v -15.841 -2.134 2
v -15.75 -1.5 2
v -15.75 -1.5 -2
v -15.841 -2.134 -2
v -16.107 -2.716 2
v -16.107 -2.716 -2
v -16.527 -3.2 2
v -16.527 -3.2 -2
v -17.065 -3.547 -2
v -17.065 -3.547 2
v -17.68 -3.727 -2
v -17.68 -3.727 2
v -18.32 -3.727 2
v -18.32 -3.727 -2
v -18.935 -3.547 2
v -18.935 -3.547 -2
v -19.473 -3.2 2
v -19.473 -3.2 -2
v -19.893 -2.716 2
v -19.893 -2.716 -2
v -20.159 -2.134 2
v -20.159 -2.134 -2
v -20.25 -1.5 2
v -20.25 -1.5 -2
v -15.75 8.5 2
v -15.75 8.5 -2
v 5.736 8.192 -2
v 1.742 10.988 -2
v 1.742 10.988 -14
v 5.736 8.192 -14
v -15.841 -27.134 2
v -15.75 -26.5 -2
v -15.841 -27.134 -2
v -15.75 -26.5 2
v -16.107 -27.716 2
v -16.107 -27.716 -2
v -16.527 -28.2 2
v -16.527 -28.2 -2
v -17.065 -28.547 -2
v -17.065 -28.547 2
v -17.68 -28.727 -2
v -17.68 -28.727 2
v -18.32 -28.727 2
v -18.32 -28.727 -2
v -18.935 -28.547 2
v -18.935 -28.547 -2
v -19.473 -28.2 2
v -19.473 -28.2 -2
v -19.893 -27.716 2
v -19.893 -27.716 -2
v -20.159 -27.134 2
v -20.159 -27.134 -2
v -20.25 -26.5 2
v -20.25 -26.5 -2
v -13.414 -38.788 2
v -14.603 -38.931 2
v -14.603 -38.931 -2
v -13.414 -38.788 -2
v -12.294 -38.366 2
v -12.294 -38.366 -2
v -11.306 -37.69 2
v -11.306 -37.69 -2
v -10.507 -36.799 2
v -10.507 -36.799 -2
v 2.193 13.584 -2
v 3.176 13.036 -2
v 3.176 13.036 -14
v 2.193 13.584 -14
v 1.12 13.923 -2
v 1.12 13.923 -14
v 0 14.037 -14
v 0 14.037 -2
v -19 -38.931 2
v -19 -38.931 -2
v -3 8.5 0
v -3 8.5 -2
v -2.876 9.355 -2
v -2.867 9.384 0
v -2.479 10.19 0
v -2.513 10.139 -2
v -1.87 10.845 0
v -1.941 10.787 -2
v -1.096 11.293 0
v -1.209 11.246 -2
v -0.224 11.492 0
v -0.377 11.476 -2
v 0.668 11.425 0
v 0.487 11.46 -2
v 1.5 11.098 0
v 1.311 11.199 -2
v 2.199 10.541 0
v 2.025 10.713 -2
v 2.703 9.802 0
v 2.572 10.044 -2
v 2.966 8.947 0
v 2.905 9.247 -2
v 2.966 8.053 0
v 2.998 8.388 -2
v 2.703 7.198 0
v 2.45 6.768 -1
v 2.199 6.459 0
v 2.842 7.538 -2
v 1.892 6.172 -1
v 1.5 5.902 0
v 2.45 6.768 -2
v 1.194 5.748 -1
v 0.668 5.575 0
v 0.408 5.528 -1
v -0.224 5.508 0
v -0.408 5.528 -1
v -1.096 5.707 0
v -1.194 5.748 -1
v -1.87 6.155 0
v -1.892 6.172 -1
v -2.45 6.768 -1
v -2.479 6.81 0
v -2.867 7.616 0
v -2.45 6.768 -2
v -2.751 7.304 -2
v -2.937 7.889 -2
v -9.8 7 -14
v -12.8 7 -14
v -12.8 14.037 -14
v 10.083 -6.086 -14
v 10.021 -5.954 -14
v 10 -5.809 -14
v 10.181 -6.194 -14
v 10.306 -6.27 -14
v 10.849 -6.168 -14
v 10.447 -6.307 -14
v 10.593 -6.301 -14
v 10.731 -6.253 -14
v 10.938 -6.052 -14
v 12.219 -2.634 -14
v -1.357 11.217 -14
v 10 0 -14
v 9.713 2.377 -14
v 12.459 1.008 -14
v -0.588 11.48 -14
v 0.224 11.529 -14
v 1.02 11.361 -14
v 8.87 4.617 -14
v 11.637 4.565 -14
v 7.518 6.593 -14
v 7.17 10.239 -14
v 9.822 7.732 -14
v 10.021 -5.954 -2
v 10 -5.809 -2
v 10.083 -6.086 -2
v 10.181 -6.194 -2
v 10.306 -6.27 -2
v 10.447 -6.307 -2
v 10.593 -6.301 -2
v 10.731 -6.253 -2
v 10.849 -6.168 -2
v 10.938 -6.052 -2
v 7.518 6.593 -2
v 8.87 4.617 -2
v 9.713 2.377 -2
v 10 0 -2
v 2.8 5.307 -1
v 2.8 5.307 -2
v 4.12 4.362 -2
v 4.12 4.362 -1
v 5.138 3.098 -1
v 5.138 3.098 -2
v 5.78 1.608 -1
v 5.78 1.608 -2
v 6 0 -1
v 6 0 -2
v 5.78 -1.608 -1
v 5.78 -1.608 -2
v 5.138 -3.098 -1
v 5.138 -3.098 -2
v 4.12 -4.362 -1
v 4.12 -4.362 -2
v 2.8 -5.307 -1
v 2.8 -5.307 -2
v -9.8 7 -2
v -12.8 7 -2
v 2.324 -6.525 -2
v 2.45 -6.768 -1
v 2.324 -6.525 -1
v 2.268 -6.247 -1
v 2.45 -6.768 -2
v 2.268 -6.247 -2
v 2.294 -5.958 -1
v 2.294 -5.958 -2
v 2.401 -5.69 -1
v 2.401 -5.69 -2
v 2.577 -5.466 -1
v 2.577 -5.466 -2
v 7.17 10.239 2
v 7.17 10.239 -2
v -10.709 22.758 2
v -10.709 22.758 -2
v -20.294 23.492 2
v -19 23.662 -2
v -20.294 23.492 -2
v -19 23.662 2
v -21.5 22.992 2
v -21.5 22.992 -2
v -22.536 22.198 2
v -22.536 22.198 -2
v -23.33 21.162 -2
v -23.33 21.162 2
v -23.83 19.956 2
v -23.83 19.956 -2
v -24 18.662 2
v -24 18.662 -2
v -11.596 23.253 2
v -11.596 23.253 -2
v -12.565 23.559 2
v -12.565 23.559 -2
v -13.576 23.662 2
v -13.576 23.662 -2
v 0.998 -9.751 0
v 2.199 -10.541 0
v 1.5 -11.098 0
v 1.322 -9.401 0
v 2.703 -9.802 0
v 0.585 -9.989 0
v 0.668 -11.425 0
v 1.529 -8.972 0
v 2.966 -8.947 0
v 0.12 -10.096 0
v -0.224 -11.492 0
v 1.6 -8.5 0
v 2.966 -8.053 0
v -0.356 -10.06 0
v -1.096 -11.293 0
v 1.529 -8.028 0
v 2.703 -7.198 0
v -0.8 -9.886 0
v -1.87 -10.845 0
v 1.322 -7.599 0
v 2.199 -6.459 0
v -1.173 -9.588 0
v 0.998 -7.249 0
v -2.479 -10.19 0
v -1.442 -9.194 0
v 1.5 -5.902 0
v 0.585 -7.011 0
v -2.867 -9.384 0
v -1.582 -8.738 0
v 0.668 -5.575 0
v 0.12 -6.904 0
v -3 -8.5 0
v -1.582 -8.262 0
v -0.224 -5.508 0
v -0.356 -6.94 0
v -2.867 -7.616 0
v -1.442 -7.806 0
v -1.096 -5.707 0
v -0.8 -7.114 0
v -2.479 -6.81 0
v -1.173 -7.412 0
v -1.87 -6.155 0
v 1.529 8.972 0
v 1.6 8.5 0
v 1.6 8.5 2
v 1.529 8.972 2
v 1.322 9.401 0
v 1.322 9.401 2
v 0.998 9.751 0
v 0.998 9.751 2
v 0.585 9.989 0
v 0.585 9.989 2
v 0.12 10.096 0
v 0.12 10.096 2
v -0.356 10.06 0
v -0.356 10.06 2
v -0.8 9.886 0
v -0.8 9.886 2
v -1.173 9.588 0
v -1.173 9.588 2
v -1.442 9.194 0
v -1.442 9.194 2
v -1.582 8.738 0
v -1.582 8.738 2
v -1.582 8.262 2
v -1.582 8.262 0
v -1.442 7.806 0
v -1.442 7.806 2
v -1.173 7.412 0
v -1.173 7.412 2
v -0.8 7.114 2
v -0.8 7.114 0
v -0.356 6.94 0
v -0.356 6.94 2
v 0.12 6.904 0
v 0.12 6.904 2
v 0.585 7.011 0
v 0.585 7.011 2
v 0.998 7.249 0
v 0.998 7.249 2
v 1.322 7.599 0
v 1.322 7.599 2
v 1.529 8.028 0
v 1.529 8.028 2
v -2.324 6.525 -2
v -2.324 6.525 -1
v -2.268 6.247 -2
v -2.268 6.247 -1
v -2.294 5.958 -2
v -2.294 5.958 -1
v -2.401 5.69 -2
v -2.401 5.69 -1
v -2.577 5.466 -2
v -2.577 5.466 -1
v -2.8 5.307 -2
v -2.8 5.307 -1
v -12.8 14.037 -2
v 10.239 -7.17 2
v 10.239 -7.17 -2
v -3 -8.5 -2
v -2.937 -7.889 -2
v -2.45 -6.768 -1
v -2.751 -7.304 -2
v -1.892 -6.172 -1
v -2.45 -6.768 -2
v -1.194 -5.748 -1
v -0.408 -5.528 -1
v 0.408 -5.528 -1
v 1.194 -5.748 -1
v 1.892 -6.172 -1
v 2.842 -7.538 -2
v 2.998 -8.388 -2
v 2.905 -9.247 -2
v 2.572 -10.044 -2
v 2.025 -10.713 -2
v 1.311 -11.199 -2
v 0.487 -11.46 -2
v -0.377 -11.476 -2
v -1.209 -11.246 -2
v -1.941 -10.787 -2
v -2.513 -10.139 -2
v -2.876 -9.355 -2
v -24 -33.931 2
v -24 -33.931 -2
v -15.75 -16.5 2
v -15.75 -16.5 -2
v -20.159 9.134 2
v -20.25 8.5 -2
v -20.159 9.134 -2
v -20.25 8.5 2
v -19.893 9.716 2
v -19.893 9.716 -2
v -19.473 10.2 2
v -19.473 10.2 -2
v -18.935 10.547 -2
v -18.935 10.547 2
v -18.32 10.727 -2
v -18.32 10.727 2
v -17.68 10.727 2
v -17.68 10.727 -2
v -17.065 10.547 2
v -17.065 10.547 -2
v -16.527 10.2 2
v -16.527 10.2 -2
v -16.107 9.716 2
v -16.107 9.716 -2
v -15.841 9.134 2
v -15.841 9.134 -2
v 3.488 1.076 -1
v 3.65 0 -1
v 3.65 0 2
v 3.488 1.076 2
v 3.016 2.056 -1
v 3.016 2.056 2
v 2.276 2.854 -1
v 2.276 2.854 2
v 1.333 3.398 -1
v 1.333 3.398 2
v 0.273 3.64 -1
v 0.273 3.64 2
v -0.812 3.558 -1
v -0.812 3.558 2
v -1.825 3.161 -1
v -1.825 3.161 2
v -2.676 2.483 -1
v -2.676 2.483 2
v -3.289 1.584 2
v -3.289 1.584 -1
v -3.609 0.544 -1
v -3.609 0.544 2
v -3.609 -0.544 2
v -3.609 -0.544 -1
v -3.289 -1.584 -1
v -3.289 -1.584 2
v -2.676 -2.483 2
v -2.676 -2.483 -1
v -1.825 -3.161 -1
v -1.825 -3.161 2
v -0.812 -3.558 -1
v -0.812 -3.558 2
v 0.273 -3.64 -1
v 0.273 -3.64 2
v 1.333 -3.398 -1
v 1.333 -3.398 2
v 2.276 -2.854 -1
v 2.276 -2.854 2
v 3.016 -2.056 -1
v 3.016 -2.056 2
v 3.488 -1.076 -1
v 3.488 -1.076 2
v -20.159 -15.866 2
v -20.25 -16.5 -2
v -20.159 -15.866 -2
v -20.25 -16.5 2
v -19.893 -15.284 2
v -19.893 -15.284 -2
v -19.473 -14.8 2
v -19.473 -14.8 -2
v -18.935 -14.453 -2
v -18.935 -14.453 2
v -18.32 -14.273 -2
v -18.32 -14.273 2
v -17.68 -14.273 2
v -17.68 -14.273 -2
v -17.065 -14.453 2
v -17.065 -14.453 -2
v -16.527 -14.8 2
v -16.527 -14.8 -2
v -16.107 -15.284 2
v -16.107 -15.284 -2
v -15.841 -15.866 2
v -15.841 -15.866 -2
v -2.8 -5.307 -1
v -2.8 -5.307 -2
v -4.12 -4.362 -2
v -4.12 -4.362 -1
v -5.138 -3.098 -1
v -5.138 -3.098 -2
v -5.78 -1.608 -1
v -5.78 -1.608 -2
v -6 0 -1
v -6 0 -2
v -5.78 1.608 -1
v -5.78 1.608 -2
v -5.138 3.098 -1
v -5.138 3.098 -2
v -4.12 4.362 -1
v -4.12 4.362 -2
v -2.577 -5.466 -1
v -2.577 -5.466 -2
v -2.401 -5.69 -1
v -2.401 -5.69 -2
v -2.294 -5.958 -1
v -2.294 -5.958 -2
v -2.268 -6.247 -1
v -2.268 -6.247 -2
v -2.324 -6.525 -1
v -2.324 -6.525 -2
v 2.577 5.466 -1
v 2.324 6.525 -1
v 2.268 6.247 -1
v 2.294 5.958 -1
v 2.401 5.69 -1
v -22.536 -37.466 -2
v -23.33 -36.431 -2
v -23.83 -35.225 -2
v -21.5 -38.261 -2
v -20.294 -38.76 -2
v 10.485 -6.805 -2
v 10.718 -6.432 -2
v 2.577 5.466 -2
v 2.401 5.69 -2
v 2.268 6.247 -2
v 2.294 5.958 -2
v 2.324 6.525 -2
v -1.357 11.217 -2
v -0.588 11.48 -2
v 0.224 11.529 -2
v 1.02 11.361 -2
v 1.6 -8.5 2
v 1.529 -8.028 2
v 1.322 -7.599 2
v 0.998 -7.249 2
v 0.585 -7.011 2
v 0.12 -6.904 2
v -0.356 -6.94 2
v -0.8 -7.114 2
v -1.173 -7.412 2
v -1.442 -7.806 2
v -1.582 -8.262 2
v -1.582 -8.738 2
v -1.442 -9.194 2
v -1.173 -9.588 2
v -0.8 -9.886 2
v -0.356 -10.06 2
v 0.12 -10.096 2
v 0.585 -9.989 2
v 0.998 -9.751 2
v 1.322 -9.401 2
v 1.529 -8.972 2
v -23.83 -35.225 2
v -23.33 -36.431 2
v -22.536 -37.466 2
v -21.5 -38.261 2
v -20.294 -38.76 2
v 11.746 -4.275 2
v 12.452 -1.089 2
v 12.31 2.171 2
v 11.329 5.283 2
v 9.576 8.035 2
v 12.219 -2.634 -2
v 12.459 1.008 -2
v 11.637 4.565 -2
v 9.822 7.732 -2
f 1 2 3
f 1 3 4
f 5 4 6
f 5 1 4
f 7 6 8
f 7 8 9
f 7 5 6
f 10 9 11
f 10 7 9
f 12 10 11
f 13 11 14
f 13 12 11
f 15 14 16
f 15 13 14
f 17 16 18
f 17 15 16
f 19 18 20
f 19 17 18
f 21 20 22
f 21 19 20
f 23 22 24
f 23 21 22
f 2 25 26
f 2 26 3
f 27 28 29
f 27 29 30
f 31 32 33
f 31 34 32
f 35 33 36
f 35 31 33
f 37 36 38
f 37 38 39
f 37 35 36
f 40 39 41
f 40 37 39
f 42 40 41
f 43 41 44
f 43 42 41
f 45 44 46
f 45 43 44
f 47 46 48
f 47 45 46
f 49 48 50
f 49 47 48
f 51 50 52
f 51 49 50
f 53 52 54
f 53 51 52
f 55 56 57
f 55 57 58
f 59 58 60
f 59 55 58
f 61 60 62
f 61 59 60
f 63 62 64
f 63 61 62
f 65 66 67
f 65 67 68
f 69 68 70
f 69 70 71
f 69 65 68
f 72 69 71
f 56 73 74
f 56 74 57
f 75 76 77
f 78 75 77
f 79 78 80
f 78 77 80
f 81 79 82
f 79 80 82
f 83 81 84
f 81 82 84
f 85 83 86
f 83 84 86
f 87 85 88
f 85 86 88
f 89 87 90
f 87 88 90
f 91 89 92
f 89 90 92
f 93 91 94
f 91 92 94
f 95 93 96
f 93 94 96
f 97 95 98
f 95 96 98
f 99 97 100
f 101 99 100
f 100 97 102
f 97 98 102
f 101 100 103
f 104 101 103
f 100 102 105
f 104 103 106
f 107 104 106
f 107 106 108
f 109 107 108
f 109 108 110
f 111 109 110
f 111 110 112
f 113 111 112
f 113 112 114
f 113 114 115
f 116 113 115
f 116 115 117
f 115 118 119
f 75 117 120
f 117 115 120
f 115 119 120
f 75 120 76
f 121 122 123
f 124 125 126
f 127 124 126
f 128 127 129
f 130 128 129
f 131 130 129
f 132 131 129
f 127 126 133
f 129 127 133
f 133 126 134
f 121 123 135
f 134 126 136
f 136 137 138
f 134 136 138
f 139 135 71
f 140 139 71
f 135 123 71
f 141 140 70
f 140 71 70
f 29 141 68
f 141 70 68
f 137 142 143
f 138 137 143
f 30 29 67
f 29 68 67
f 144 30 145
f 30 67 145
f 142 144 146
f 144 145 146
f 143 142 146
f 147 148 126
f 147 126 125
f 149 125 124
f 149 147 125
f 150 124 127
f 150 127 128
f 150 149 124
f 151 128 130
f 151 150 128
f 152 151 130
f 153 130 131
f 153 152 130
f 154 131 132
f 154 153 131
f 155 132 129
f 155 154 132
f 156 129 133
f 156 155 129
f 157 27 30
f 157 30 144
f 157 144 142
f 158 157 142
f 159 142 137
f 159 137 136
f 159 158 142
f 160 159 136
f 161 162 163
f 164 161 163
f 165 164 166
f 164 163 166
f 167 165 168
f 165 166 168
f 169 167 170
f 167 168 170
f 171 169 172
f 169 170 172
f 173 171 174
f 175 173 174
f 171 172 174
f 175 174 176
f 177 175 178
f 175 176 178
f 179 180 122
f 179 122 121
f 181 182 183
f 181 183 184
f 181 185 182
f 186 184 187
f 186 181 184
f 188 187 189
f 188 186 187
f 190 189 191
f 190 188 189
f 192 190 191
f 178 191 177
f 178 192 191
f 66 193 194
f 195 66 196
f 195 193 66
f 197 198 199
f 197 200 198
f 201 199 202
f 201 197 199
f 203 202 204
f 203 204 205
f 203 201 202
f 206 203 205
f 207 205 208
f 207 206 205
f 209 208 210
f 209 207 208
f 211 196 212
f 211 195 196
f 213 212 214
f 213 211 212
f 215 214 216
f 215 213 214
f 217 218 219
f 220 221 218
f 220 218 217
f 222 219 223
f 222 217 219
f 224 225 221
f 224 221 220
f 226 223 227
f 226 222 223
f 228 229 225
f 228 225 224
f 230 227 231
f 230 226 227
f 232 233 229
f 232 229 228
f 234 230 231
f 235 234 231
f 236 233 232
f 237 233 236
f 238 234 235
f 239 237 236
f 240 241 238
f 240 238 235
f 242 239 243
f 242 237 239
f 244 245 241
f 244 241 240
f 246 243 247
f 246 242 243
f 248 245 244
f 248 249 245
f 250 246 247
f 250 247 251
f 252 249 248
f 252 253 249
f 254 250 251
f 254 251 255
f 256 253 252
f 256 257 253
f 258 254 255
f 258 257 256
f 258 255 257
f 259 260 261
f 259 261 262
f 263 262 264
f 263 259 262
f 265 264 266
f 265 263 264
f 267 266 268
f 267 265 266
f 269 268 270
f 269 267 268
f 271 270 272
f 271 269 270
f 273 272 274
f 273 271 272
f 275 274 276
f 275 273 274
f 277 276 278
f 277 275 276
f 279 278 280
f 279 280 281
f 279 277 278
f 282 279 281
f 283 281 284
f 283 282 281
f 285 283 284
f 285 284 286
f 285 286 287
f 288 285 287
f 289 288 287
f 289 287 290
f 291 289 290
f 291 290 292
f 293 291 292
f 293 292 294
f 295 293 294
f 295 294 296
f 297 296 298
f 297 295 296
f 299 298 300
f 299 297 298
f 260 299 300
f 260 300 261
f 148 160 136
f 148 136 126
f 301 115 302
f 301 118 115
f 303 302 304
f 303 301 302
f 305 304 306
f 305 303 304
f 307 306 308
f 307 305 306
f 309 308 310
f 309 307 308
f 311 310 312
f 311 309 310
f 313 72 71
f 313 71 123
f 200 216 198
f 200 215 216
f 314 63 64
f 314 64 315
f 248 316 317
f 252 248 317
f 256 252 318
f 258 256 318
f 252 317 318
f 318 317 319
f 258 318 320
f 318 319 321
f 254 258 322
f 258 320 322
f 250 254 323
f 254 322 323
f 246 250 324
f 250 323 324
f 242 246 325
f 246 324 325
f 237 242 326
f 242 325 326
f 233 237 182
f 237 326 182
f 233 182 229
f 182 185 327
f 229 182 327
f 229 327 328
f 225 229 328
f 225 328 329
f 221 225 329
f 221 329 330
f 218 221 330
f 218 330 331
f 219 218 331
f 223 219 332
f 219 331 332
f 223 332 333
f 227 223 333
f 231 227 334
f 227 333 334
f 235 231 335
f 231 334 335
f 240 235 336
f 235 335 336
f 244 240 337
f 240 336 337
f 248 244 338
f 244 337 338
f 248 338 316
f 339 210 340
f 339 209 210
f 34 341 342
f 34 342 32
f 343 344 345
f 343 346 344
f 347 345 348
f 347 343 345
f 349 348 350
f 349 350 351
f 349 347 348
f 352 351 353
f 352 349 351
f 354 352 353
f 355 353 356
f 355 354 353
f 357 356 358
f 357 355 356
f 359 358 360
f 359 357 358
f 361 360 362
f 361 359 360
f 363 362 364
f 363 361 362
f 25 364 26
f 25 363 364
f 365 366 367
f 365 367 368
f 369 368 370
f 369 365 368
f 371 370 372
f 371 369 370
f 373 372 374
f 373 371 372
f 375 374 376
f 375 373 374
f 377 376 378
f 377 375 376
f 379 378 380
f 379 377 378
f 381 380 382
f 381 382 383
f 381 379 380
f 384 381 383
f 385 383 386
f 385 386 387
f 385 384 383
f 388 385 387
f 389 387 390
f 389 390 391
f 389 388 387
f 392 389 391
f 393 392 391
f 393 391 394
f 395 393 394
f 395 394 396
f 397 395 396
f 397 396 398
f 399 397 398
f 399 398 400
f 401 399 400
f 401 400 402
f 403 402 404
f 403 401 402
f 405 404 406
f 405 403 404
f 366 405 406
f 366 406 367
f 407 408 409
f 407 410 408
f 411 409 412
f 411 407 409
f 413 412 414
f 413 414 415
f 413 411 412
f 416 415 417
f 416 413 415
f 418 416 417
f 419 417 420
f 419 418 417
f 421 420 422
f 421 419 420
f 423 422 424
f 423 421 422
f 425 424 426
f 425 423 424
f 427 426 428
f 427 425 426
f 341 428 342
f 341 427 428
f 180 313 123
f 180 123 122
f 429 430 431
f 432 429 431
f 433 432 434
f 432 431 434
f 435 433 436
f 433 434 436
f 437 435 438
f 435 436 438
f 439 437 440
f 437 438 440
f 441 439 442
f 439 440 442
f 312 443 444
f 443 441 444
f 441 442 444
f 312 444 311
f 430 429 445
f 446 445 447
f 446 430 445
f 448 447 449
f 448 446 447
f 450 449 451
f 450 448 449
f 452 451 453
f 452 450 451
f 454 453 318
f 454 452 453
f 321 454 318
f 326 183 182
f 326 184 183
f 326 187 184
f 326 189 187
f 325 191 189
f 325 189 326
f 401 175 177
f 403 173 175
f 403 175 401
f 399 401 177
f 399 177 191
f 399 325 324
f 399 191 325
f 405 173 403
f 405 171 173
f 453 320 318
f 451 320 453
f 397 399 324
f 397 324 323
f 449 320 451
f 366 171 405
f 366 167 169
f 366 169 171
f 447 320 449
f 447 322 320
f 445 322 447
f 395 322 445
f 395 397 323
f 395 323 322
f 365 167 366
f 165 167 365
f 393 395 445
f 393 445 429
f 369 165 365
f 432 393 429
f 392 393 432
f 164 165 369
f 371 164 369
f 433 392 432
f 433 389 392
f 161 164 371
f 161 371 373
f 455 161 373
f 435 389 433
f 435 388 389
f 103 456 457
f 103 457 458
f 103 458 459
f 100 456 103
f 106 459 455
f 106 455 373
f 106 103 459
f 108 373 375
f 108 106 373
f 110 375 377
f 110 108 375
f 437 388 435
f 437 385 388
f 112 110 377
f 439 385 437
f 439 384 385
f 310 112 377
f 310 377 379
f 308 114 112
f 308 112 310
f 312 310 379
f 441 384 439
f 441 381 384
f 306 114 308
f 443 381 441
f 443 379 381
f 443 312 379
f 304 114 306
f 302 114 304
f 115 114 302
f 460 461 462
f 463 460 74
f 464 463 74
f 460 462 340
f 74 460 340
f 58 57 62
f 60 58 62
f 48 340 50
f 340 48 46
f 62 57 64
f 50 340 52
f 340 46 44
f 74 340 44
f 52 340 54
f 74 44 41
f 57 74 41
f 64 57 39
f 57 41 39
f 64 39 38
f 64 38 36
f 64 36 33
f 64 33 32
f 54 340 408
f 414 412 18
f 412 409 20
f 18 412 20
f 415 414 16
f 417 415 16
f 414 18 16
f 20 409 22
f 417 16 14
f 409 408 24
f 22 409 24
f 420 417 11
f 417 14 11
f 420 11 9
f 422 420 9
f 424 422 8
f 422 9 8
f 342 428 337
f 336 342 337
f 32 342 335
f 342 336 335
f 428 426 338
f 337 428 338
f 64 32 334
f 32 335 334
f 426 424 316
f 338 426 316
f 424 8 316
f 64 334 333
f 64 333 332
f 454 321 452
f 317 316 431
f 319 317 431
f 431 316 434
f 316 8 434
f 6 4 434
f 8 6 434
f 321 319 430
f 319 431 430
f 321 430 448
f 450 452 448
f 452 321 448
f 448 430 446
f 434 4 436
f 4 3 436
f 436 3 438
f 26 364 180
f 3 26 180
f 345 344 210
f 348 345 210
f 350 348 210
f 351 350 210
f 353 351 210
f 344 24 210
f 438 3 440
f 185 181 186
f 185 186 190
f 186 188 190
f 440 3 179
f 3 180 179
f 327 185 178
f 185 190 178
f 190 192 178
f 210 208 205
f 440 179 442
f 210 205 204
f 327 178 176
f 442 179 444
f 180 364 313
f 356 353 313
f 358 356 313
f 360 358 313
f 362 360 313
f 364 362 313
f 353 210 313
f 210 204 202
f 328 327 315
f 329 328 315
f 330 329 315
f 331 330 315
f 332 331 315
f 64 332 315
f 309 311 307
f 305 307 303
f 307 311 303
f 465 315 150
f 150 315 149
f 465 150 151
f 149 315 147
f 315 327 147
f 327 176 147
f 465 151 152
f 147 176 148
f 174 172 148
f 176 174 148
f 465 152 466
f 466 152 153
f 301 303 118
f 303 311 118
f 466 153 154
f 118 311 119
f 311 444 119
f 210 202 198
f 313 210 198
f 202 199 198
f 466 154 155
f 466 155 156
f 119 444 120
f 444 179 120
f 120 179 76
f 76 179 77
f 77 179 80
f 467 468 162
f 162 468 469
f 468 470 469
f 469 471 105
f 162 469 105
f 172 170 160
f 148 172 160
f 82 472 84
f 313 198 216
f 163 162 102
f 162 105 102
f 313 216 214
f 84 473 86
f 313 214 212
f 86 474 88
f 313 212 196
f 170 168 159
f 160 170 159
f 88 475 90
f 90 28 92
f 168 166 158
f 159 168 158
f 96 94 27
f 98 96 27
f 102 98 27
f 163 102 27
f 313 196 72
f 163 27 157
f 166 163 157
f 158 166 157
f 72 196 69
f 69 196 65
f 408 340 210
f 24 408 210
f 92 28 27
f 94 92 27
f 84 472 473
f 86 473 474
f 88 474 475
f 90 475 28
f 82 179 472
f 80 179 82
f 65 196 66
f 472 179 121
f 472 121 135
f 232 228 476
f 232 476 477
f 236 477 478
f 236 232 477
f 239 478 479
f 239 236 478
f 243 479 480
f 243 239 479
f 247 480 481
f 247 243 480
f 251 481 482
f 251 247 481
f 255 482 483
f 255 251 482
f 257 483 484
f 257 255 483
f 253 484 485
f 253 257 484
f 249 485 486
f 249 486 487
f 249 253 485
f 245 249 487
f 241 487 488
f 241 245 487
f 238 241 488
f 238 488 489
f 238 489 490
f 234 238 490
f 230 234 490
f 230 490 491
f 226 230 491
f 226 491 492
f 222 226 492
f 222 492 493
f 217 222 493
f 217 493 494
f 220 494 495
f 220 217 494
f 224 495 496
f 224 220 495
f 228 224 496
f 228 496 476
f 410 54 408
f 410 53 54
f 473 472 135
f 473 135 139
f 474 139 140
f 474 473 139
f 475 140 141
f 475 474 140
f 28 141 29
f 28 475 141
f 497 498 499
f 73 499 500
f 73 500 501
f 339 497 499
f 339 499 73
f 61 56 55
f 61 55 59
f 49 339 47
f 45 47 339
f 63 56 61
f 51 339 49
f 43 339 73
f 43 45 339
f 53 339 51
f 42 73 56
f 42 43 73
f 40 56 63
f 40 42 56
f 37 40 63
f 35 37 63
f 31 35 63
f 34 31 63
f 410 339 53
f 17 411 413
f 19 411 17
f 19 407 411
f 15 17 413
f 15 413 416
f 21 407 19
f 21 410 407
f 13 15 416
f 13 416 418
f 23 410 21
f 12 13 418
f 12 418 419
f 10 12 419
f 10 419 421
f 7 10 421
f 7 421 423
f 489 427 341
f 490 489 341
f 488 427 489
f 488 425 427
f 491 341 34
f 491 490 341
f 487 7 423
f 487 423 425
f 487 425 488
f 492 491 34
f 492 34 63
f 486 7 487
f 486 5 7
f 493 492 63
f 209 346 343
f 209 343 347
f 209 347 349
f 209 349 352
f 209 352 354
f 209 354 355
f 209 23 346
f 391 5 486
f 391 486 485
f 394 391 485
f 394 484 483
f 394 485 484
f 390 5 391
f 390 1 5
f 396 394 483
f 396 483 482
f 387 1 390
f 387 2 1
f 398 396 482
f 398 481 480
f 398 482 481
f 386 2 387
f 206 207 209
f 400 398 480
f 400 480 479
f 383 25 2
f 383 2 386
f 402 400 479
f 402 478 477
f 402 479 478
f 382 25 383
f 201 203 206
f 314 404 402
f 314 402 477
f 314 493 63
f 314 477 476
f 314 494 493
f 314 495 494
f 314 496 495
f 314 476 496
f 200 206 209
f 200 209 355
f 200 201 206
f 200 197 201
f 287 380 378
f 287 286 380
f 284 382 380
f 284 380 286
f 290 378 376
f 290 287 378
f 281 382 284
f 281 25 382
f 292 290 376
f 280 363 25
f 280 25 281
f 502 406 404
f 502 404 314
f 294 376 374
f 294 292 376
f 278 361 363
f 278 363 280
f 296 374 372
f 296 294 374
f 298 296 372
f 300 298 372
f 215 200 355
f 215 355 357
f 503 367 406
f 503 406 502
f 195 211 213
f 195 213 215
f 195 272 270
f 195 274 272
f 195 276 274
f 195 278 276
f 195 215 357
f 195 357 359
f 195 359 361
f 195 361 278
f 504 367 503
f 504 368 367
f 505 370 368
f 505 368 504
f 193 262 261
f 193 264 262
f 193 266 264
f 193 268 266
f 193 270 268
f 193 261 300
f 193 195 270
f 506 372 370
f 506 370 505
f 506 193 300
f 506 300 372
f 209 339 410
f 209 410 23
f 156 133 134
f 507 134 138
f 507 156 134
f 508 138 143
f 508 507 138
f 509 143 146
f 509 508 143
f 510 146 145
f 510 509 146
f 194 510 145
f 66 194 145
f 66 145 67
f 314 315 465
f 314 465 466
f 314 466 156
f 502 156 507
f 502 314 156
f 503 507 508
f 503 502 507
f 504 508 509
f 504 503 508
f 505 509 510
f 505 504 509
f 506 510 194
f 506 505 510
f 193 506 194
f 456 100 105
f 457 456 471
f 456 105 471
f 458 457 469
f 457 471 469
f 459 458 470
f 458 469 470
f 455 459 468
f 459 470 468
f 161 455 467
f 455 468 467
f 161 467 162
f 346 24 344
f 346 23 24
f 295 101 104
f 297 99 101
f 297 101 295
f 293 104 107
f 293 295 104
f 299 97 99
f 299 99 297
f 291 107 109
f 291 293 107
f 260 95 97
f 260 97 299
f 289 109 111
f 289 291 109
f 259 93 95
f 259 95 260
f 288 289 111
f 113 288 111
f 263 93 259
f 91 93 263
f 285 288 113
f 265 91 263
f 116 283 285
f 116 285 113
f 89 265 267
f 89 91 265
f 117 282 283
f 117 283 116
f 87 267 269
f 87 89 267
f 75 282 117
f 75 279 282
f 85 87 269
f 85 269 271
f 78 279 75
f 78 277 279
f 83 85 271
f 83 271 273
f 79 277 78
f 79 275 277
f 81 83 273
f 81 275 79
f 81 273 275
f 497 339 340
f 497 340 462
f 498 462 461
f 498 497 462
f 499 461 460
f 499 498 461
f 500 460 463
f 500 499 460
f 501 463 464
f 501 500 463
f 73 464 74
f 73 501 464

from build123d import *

# Parameters (mm, degrees)
SKETCH1_R           = 3.65
SKETCH1_R_2         = 1.6
BOSS_EXTRUDE1_DEPTH = 2
SKETCH2_R           = 3
CUT_EXTRUDE1_DEPTH  = 2
SKETCH3_R           = 6
CUT_EXTRUDE2_DEPTH  = 1
FILLET1_R           = 1
BOSS_EXTRUDE2_DEPTH = 12


with BuildPart() as part:
    # Sketch1 → Boss-Extrude1 (new, symmetric)
    with BuildSketch(Plane.XY):
        with BuildLine():
            Line((-24, 18.662172818), (-24, -33.930861026))
            ThreePointArc((-24, -33.930861026), (-22.535533906, -37.466394932), (-19, -38.930861026))
            Line((-19, -38.930861026), (-14.602835253, -38.930861026))
            ThreePointArc((-14.602835253, -38.930861026), (-12.294092187, -38.365915192), (-10.507075031, -36.798743208))
            Line((-10.507075031, -36.798743208), (10.239400554, -7.169705454))
            ThreePointArc((10.239400554, -7.169705454), (12.310096913, 2.170602221), (7.169705454, 10.239400554))
            Line((7.169705454, 10.239400554), (-10.708611763, 22.757933039))
            ThreePointArc((-10.708611763, 22.757933039), (-12.072964947, 23.430757572), (-13.576493944, 23.662172818))
            Line((-13.576493944, 23.662172818), (-19, 23.662172818))
            ThreePointArc((-19, 23.662172818), (-22.535533906, 22.197706724), (-24, 18.662172818))
        make_face()
        Circle(SKETCH1_R, mode=Mode.SUBTRACT)
        with Locations((0, 8.5)):
            Circle(SKETCH1_R_2, mode=Mode.SUBTRACT)
        with Locations((0, -8.5)):
            Circle(SKETCH1_R_2, mode=Mode.SUBTRACT)
        with BuildLine():
            Line((-15.75, 8.5), (-15.75, -1.5))
            ThreePointArc((-15.75, -1.5), (-18, -3.75), (-20.25, -1.5))
            Line((-20.25, -1.5), (-20.25, 8.5))
            ThreePointArc((-20.25, 8.5), (-18, 10.75), (-15.75, 8.5))
        make_face(mode=Mode.SUBTRACT)
        with BuildLine():
            Line((-15.75, -16.5), (-15.75, -26.5))
            ThreePointArc((-15.75, -26.5), (-18, -28.75), (-20.25, -26.5))
            Line((-20.25, -26.5), (-20.25, -16.5))
            ThreePointArc((-20.25, -16.5), (-18, -14.25), (-15.75, -16.5))
        make_face(mode=Mode.SUBTRACT)
    extrude(amount=BOSS_EXTRUDE1_DEPTH, both=True)

    # Sketch2 → Cut-Extrude1 (cut)
    with BuildSketch(Plane(origin=(0, 0, -2), x_dir=(-1, 0, 0), z_dir=(0, 0, -1))):
        with Locations((0, 8.5)):
            Circle(SKETCH2_R)
        with Locations((0, -8.5)):
            Circle(SKETCH2_R)
    extrude(amount=-CUT_EXTRUDE1_DEPTH, mode=Mode.SUBTRACT)

    # Sketch3 → Cut-Extrude2 (cut)
    with BuildSketch(Plane(origin=(0, 0, -2), x_dir=(-1, 0, 0), z_dir=(0, 0, -1))):
        Circle(SKETCH3_R)
    extrude(amount=-CUT_EXTRUDE2_DEPTH, mode=Mode.SUBTRACT)

    # Fillet1
    fillet1_edges = [part.edges().sort_by_distance(p)[0] for p in [
        (-1.383838376, -5.838235294, -1.5),
        (1.383838376, -5.838235294, -1.5),
        (-1.383838376, 5.838235294, -1.5),
        (1.383838376, 5.838235294, -1.5),
    ]]
    fillet(fillet1_edges, radius=FILLET1_R)

    # Sketch4 → Boss-Extrude2 (add)
    with BuildSketch(Plane(origin=(0, 0, -2), x_dir=(-1, 0, 0), z_dir=(0, 0, -1))):
        with BuildLine():
            Line((9.8, 7), (1.357173626, 11.217114259))
            ThreePointArc((1.357173626, 11.217114259), (-0.22398046, 11.528937586), (-1.742070725, 10.987934834))
            Line((-1.742070725, 10.987934834), (-5.735764364, 8.191520443))
            ThreePointArc((-5.735764364, 8.191520443), (-8.870108332, 4.617486132), (-10, 0))
            Line((-10, 0), (-10, -5.809475019))
            ThreePointArc((-10, -5.809475019), (-10.375, -6.293597938), (-10.9375, -6.051536478))
            ThreePointArc((-10.9375, -6.051536478), (-12.178521244, 2.8166683), (-7.169705454, 10.239400554))
            Line((-7.169705454, 10.239400554), (-3.176011816, 13.035814944))
            ThreePointArc((-3.176011816, 13.035814944), (-1.665070445, 13.78092877), (0, 14.037207624))
            Line((0, 14.037207624), (12.8, 14.037207624))
            Line((12.8, 14.037207624), (12.8, 7))
            Line((12.8, 7), (9.8, 7))
        make_face()
    extrude(amount=BOSS_EXTRUDE2_DEPTH)


solid = part.part
